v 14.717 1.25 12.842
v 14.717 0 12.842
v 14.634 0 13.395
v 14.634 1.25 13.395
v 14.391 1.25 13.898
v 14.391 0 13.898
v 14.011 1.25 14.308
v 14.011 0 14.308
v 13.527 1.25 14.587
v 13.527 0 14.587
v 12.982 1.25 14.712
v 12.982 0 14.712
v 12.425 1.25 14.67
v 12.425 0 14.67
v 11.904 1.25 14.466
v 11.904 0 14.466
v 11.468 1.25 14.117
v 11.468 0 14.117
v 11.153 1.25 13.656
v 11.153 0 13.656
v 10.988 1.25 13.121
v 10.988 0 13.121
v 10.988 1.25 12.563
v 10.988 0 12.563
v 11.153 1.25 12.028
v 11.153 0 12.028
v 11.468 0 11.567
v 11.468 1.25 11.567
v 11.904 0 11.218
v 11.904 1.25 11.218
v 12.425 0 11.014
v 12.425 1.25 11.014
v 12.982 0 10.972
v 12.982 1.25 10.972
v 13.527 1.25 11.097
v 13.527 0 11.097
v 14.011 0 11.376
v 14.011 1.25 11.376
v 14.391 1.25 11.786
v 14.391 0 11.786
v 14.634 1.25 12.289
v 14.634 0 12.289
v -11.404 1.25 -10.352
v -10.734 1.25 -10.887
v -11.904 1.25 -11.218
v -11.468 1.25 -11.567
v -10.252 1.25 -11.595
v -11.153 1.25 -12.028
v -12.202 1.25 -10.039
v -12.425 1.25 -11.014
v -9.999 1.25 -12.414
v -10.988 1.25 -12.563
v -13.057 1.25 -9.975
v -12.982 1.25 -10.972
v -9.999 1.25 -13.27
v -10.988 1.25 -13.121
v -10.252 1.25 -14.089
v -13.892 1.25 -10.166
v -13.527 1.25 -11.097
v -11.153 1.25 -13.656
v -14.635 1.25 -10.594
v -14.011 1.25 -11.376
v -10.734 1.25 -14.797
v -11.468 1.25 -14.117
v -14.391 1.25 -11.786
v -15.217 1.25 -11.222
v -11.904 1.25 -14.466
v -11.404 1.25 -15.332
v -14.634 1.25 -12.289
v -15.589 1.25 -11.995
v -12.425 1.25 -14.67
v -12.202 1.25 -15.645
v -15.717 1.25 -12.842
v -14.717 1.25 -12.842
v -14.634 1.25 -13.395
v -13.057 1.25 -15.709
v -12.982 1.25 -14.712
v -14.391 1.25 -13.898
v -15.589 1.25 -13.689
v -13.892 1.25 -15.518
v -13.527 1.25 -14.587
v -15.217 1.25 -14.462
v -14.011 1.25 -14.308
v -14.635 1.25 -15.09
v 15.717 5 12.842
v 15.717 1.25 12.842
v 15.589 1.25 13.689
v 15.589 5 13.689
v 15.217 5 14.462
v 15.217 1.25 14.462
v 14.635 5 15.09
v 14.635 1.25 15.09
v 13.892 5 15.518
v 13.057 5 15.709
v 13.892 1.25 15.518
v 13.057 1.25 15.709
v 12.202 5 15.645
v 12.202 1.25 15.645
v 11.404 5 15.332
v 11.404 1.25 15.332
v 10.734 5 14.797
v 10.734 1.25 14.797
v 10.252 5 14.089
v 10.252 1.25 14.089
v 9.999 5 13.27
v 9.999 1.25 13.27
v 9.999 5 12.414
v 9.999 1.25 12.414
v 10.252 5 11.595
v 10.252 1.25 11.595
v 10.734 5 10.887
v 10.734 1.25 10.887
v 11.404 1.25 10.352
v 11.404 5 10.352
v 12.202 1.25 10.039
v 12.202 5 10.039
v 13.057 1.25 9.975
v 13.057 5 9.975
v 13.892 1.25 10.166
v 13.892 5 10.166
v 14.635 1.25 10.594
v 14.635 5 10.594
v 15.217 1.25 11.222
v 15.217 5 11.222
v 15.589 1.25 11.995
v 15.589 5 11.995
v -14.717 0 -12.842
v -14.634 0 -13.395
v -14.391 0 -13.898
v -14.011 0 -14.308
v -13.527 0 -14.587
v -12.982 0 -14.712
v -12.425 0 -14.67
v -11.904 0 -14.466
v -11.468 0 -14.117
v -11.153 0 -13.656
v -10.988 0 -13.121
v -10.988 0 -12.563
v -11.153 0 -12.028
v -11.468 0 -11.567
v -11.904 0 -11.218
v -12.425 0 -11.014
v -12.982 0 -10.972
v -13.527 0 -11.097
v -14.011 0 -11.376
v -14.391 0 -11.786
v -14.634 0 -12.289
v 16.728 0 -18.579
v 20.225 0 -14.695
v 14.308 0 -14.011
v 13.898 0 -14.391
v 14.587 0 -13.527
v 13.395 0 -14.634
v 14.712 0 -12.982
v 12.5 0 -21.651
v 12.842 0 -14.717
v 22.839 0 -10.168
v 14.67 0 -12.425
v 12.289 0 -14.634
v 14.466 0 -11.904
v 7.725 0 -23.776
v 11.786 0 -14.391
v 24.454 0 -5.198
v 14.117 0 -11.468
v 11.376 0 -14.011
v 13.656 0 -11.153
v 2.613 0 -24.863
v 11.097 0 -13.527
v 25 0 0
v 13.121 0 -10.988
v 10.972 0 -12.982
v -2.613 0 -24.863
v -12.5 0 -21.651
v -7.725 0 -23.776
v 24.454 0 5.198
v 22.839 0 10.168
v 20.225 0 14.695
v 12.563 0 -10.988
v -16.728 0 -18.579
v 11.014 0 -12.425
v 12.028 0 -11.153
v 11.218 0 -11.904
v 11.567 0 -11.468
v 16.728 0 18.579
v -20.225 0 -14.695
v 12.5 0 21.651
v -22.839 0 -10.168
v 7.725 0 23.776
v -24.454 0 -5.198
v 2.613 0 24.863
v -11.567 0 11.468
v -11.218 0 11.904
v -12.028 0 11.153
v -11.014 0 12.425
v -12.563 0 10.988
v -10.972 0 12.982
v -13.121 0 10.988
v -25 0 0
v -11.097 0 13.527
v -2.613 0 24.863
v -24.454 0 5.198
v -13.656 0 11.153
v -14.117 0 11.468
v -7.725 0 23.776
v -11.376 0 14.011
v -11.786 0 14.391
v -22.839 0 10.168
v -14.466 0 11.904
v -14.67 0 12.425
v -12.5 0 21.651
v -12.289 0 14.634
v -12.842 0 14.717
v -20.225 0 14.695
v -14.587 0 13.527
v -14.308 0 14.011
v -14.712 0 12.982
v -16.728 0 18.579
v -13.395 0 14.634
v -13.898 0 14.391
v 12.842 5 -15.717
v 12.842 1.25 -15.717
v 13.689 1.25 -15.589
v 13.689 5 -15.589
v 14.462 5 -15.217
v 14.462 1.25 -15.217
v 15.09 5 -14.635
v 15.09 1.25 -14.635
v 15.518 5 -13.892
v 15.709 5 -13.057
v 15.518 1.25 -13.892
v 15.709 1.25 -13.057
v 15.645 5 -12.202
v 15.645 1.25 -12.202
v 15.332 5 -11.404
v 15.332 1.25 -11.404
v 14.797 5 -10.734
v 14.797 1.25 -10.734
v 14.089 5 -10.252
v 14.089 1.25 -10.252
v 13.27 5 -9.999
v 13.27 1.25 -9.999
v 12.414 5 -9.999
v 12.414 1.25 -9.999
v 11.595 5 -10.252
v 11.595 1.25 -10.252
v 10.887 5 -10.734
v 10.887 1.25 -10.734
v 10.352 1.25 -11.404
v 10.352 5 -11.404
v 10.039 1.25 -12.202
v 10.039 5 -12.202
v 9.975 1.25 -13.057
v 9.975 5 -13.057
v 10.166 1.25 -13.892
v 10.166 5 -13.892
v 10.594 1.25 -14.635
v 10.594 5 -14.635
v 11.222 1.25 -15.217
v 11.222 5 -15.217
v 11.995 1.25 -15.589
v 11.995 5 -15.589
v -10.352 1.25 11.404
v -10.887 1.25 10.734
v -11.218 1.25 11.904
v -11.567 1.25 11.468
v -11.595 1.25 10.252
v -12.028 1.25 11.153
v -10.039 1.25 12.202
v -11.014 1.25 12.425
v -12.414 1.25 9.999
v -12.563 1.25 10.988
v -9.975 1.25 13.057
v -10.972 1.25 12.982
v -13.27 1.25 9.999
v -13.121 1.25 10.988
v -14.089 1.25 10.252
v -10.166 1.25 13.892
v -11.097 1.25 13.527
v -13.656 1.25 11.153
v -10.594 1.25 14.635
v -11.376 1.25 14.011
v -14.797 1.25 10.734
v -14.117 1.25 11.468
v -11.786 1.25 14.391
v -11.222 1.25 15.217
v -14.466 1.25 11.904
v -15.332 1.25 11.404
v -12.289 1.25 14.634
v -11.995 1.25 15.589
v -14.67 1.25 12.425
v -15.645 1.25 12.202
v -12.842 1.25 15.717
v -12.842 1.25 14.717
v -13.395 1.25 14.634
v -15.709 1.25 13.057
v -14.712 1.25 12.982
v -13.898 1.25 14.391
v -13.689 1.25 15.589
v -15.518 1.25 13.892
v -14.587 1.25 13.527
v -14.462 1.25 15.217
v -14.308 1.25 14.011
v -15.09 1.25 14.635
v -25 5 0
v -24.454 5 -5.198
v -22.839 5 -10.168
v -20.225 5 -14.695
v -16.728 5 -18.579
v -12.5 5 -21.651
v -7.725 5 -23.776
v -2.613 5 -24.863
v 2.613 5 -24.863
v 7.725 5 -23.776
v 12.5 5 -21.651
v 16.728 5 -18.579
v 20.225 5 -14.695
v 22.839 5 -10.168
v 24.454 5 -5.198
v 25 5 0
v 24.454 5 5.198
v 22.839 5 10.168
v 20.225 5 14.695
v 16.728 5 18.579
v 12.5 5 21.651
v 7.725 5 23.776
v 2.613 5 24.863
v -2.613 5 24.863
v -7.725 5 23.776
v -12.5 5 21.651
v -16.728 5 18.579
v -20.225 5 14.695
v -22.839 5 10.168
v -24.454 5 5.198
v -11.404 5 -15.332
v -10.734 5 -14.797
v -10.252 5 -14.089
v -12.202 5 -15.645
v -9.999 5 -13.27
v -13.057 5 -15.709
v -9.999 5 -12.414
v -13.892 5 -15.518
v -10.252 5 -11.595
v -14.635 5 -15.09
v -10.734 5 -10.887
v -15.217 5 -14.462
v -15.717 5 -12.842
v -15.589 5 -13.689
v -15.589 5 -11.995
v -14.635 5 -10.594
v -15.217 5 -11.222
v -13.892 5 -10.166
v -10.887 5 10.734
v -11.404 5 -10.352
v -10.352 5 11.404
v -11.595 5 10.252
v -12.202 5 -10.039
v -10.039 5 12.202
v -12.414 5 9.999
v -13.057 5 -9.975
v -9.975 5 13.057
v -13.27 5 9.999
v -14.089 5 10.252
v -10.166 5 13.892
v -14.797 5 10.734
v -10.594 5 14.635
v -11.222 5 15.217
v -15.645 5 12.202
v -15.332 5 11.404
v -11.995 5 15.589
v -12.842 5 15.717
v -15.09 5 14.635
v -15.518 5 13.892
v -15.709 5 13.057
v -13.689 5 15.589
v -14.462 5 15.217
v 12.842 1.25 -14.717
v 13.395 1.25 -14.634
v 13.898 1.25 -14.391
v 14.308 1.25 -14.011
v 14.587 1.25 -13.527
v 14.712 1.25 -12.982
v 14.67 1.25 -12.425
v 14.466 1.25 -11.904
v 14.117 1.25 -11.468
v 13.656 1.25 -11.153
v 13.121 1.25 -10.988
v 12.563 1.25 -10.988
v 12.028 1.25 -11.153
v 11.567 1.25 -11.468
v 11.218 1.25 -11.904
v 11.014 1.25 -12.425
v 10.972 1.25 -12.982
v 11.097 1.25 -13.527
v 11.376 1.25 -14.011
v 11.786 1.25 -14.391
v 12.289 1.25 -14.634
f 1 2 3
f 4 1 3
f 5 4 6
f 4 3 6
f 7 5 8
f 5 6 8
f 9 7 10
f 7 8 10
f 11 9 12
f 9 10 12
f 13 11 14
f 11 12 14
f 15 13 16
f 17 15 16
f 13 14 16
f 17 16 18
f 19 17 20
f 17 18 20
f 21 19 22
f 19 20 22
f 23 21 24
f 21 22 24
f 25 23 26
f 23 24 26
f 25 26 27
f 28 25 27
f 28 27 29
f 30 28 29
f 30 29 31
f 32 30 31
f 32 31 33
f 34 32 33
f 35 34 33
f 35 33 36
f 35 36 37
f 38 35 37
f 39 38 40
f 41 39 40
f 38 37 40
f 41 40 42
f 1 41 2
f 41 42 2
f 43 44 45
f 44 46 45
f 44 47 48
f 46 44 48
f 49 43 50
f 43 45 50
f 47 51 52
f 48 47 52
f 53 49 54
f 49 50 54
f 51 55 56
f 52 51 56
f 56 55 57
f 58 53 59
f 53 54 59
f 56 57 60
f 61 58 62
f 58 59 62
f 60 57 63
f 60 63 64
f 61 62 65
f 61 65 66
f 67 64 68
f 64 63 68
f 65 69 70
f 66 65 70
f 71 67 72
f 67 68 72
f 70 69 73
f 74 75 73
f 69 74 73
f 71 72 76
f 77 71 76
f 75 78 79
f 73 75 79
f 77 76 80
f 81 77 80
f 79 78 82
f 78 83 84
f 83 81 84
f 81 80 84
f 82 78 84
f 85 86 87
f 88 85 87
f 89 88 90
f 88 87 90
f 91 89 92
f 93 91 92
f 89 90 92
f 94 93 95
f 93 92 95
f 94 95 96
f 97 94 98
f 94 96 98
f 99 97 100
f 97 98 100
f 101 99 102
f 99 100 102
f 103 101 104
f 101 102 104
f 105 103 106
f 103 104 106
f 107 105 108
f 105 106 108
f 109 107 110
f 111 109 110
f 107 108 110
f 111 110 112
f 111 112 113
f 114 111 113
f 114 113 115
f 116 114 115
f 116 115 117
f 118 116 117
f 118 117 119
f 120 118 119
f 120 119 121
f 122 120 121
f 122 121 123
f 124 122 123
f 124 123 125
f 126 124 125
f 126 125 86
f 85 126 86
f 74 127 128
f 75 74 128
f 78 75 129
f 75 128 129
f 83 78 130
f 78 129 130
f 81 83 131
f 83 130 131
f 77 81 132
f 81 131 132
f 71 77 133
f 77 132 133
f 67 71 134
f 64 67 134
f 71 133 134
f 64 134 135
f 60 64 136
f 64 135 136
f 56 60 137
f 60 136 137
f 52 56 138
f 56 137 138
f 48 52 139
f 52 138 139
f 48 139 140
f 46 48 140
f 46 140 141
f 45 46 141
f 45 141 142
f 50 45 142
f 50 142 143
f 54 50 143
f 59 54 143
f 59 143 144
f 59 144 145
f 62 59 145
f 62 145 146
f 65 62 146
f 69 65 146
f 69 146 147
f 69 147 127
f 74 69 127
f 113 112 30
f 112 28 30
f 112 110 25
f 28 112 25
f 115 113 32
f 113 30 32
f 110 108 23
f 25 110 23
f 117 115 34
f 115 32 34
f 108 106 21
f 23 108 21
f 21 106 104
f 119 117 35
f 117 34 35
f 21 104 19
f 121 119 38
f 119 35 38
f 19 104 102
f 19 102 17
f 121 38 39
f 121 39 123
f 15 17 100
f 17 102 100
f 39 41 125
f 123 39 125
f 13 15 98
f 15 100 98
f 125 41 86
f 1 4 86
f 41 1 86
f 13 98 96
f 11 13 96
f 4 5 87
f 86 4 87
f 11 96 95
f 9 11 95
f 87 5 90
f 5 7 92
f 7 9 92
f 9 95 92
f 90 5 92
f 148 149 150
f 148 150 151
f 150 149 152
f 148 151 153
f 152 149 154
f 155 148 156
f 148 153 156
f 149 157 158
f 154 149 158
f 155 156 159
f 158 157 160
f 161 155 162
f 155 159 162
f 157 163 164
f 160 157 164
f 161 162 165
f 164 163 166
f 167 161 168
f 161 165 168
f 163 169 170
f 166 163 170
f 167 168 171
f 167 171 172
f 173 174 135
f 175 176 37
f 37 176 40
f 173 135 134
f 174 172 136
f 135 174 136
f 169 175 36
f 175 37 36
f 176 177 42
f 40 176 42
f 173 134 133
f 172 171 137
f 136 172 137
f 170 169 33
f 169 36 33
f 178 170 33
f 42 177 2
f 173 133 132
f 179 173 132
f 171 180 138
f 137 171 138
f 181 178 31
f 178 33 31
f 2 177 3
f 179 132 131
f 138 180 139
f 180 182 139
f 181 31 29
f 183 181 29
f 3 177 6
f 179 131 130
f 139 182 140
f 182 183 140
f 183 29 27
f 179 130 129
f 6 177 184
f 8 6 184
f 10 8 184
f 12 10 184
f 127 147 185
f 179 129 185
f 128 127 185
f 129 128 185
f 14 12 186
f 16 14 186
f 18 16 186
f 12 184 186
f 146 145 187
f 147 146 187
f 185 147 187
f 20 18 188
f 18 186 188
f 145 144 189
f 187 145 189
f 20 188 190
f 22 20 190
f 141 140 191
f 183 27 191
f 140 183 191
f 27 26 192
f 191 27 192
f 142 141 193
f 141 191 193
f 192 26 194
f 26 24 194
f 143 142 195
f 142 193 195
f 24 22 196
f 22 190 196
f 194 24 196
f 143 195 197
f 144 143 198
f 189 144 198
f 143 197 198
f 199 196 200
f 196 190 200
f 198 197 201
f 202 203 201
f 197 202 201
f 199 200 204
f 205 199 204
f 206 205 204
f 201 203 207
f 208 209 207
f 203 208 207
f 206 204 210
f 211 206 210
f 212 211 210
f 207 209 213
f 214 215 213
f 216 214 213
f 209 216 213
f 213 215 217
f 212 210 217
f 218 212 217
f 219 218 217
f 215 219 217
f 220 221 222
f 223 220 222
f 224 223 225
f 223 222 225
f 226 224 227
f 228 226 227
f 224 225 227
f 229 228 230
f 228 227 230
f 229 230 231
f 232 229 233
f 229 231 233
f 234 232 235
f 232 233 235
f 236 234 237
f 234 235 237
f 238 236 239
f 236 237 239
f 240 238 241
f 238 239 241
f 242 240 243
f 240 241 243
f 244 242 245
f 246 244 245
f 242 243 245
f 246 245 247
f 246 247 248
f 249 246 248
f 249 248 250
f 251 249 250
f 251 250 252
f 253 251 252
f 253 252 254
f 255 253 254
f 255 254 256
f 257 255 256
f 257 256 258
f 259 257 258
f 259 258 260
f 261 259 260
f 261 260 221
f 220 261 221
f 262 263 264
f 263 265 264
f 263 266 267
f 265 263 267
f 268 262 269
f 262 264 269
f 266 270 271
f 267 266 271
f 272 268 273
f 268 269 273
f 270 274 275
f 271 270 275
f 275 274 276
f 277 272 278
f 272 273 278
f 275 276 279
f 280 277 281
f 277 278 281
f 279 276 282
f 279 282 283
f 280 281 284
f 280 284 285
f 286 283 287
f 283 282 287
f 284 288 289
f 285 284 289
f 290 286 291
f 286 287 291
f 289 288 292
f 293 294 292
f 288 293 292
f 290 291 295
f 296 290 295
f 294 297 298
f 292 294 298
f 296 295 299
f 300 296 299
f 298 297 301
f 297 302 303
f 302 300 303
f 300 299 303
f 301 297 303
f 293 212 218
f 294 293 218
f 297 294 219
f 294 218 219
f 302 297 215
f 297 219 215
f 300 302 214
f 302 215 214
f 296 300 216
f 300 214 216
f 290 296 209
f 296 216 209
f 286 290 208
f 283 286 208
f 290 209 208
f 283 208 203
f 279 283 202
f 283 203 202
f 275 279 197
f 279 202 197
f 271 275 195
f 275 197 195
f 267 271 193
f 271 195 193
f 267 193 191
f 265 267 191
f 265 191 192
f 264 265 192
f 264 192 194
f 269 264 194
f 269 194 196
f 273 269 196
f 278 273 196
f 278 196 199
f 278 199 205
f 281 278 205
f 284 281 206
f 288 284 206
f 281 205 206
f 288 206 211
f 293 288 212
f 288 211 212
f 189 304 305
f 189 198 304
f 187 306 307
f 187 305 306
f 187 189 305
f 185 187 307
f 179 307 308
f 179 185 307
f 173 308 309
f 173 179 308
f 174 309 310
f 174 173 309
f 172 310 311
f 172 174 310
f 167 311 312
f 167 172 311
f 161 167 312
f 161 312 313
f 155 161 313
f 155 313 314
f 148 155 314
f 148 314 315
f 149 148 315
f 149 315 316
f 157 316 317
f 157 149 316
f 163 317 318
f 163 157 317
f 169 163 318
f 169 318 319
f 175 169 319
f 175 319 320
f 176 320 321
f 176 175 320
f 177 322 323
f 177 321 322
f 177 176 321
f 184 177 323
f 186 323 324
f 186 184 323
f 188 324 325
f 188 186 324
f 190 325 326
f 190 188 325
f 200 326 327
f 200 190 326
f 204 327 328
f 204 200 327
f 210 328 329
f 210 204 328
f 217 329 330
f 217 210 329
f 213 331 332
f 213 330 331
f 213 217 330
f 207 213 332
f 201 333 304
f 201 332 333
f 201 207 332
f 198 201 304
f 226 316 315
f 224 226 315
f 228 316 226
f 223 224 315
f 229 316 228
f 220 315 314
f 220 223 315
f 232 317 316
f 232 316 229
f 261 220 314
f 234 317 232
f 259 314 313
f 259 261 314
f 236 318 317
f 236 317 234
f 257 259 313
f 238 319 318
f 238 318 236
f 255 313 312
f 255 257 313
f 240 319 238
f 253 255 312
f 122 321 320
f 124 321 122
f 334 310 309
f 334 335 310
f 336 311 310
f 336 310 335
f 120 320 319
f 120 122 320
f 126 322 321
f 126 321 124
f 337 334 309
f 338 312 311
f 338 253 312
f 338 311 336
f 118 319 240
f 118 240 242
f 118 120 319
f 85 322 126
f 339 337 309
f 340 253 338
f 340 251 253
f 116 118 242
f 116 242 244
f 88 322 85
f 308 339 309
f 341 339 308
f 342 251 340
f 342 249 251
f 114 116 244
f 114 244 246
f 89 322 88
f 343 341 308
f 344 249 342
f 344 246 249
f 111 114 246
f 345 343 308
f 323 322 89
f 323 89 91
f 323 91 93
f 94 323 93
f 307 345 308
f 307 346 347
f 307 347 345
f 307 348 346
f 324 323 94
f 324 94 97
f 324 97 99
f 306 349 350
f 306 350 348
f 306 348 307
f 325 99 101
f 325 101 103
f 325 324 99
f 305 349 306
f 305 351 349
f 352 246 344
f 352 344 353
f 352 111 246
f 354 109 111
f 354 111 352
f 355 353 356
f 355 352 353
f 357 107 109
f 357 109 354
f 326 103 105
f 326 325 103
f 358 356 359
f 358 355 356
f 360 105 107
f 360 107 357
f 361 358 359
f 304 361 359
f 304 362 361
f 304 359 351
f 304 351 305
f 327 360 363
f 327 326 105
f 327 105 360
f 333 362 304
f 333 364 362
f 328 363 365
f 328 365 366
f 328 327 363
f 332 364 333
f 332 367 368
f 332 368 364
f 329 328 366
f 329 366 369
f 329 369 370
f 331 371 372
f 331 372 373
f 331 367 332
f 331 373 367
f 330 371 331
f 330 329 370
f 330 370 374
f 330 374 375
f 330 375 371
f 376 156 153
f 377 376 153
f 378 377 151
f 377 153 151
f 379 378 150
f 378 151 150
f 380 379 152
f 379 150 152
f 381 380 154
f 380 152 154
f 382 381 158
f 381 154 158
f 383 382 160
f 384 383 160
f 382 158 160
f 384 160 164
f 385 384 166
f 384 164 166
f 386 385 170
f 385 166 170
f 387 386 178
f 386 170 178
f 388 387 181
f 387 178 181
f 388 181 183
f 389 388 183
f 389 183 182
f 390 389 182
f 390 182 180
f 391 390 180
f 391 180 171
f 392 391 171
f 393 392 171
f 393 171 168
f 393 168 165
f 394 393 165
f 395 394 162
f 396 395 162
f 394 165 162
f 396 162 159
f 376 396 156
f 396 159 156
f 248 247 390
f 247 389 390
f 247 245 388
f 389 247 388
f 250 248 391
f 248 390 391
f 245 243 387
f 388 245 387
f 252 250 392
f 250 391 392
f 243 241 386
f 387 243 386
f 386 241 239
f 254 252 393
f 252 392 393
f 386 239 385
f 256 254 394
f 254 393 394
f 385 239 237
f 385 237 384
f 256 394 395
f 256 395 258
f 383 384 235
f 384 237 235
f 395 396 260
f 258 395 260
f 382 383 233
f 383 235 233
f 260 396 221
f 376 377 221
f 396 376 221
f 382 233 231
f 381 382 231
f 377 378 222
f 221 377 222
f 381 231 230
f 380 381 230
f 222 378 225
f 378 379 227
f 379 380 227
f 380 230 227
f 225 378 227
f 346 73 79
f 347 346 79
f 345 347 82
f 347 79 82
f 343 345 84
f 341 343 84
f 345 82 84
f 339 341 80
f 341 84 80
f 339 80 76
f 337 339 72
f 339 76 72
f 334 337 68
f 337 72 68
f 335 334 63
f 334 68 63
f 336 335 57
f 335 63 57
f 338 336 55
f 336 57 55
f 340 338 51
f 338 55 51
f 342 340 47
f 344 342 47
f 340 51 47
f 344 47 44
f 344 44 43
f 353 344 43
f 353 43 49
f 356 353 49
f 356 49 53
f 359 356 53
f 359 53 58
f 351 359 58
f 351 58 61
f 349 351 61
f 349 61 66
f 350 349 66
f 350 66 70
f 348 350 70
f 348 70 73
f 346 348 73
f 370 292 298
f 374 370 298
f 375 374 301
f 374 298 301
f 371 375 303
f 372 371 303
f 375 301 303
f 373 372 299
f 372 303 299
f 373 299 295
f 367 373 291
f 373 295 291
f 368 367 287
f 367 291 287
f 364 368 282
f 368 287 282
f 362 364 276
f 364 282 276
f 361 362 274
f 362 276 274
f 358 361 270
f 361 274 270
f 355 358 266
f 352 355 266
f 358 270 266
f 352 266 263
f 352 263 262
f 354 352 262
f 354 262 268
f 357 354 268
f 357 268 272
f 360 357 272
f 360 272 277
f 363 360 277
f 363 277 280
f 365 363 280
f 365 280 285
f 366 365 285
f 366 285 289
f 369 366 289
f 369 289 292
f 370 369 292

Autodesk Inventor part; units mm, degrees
ref_plane "YZ Plane" through (0, 0, 0) normal (1, 0, 0) x (0, 1, 0)
ref_plane "XZ Plane" through (0, 0, 0) normal (0, 1, 0) x (-1, 0, 0)
ref_plane "XY Plane" through (0, 0, 0) normal (0, 0, 1) x (1, 0, 0)
sketch "Sketch1" plane through (0, 0, 0) normal (0, 1, 0) x (-1, 0, 0)
  circle A0 centre (0, 0) radius 25
  dimension "d0" = 50
extrude "Extrusion1" add sketch "Sketch1" along normal blind 5
sketch "Sketch3" plane through (0, 5, 0) normal (0, 1, 0) x (1, 0, 0)
  point P0 (0, 0)
  point P1 (-12.842, -12.842)
  dimension "d25" = 12.842
  dimension "d26" = 12.842
hole "Hole2" at (-12.842, 5, 12.842) direction (0, -1, 0) diameter 3.75 depth 14.944 counterbore diameter 5.75 counterbore depth 3.75
pattern_circular "Circular Pattern1" count 4 over 360 about axis through (0, -10, 0) along (0, 1, 0) of "Hole2"
properties part number "PrismCageAdapter"
